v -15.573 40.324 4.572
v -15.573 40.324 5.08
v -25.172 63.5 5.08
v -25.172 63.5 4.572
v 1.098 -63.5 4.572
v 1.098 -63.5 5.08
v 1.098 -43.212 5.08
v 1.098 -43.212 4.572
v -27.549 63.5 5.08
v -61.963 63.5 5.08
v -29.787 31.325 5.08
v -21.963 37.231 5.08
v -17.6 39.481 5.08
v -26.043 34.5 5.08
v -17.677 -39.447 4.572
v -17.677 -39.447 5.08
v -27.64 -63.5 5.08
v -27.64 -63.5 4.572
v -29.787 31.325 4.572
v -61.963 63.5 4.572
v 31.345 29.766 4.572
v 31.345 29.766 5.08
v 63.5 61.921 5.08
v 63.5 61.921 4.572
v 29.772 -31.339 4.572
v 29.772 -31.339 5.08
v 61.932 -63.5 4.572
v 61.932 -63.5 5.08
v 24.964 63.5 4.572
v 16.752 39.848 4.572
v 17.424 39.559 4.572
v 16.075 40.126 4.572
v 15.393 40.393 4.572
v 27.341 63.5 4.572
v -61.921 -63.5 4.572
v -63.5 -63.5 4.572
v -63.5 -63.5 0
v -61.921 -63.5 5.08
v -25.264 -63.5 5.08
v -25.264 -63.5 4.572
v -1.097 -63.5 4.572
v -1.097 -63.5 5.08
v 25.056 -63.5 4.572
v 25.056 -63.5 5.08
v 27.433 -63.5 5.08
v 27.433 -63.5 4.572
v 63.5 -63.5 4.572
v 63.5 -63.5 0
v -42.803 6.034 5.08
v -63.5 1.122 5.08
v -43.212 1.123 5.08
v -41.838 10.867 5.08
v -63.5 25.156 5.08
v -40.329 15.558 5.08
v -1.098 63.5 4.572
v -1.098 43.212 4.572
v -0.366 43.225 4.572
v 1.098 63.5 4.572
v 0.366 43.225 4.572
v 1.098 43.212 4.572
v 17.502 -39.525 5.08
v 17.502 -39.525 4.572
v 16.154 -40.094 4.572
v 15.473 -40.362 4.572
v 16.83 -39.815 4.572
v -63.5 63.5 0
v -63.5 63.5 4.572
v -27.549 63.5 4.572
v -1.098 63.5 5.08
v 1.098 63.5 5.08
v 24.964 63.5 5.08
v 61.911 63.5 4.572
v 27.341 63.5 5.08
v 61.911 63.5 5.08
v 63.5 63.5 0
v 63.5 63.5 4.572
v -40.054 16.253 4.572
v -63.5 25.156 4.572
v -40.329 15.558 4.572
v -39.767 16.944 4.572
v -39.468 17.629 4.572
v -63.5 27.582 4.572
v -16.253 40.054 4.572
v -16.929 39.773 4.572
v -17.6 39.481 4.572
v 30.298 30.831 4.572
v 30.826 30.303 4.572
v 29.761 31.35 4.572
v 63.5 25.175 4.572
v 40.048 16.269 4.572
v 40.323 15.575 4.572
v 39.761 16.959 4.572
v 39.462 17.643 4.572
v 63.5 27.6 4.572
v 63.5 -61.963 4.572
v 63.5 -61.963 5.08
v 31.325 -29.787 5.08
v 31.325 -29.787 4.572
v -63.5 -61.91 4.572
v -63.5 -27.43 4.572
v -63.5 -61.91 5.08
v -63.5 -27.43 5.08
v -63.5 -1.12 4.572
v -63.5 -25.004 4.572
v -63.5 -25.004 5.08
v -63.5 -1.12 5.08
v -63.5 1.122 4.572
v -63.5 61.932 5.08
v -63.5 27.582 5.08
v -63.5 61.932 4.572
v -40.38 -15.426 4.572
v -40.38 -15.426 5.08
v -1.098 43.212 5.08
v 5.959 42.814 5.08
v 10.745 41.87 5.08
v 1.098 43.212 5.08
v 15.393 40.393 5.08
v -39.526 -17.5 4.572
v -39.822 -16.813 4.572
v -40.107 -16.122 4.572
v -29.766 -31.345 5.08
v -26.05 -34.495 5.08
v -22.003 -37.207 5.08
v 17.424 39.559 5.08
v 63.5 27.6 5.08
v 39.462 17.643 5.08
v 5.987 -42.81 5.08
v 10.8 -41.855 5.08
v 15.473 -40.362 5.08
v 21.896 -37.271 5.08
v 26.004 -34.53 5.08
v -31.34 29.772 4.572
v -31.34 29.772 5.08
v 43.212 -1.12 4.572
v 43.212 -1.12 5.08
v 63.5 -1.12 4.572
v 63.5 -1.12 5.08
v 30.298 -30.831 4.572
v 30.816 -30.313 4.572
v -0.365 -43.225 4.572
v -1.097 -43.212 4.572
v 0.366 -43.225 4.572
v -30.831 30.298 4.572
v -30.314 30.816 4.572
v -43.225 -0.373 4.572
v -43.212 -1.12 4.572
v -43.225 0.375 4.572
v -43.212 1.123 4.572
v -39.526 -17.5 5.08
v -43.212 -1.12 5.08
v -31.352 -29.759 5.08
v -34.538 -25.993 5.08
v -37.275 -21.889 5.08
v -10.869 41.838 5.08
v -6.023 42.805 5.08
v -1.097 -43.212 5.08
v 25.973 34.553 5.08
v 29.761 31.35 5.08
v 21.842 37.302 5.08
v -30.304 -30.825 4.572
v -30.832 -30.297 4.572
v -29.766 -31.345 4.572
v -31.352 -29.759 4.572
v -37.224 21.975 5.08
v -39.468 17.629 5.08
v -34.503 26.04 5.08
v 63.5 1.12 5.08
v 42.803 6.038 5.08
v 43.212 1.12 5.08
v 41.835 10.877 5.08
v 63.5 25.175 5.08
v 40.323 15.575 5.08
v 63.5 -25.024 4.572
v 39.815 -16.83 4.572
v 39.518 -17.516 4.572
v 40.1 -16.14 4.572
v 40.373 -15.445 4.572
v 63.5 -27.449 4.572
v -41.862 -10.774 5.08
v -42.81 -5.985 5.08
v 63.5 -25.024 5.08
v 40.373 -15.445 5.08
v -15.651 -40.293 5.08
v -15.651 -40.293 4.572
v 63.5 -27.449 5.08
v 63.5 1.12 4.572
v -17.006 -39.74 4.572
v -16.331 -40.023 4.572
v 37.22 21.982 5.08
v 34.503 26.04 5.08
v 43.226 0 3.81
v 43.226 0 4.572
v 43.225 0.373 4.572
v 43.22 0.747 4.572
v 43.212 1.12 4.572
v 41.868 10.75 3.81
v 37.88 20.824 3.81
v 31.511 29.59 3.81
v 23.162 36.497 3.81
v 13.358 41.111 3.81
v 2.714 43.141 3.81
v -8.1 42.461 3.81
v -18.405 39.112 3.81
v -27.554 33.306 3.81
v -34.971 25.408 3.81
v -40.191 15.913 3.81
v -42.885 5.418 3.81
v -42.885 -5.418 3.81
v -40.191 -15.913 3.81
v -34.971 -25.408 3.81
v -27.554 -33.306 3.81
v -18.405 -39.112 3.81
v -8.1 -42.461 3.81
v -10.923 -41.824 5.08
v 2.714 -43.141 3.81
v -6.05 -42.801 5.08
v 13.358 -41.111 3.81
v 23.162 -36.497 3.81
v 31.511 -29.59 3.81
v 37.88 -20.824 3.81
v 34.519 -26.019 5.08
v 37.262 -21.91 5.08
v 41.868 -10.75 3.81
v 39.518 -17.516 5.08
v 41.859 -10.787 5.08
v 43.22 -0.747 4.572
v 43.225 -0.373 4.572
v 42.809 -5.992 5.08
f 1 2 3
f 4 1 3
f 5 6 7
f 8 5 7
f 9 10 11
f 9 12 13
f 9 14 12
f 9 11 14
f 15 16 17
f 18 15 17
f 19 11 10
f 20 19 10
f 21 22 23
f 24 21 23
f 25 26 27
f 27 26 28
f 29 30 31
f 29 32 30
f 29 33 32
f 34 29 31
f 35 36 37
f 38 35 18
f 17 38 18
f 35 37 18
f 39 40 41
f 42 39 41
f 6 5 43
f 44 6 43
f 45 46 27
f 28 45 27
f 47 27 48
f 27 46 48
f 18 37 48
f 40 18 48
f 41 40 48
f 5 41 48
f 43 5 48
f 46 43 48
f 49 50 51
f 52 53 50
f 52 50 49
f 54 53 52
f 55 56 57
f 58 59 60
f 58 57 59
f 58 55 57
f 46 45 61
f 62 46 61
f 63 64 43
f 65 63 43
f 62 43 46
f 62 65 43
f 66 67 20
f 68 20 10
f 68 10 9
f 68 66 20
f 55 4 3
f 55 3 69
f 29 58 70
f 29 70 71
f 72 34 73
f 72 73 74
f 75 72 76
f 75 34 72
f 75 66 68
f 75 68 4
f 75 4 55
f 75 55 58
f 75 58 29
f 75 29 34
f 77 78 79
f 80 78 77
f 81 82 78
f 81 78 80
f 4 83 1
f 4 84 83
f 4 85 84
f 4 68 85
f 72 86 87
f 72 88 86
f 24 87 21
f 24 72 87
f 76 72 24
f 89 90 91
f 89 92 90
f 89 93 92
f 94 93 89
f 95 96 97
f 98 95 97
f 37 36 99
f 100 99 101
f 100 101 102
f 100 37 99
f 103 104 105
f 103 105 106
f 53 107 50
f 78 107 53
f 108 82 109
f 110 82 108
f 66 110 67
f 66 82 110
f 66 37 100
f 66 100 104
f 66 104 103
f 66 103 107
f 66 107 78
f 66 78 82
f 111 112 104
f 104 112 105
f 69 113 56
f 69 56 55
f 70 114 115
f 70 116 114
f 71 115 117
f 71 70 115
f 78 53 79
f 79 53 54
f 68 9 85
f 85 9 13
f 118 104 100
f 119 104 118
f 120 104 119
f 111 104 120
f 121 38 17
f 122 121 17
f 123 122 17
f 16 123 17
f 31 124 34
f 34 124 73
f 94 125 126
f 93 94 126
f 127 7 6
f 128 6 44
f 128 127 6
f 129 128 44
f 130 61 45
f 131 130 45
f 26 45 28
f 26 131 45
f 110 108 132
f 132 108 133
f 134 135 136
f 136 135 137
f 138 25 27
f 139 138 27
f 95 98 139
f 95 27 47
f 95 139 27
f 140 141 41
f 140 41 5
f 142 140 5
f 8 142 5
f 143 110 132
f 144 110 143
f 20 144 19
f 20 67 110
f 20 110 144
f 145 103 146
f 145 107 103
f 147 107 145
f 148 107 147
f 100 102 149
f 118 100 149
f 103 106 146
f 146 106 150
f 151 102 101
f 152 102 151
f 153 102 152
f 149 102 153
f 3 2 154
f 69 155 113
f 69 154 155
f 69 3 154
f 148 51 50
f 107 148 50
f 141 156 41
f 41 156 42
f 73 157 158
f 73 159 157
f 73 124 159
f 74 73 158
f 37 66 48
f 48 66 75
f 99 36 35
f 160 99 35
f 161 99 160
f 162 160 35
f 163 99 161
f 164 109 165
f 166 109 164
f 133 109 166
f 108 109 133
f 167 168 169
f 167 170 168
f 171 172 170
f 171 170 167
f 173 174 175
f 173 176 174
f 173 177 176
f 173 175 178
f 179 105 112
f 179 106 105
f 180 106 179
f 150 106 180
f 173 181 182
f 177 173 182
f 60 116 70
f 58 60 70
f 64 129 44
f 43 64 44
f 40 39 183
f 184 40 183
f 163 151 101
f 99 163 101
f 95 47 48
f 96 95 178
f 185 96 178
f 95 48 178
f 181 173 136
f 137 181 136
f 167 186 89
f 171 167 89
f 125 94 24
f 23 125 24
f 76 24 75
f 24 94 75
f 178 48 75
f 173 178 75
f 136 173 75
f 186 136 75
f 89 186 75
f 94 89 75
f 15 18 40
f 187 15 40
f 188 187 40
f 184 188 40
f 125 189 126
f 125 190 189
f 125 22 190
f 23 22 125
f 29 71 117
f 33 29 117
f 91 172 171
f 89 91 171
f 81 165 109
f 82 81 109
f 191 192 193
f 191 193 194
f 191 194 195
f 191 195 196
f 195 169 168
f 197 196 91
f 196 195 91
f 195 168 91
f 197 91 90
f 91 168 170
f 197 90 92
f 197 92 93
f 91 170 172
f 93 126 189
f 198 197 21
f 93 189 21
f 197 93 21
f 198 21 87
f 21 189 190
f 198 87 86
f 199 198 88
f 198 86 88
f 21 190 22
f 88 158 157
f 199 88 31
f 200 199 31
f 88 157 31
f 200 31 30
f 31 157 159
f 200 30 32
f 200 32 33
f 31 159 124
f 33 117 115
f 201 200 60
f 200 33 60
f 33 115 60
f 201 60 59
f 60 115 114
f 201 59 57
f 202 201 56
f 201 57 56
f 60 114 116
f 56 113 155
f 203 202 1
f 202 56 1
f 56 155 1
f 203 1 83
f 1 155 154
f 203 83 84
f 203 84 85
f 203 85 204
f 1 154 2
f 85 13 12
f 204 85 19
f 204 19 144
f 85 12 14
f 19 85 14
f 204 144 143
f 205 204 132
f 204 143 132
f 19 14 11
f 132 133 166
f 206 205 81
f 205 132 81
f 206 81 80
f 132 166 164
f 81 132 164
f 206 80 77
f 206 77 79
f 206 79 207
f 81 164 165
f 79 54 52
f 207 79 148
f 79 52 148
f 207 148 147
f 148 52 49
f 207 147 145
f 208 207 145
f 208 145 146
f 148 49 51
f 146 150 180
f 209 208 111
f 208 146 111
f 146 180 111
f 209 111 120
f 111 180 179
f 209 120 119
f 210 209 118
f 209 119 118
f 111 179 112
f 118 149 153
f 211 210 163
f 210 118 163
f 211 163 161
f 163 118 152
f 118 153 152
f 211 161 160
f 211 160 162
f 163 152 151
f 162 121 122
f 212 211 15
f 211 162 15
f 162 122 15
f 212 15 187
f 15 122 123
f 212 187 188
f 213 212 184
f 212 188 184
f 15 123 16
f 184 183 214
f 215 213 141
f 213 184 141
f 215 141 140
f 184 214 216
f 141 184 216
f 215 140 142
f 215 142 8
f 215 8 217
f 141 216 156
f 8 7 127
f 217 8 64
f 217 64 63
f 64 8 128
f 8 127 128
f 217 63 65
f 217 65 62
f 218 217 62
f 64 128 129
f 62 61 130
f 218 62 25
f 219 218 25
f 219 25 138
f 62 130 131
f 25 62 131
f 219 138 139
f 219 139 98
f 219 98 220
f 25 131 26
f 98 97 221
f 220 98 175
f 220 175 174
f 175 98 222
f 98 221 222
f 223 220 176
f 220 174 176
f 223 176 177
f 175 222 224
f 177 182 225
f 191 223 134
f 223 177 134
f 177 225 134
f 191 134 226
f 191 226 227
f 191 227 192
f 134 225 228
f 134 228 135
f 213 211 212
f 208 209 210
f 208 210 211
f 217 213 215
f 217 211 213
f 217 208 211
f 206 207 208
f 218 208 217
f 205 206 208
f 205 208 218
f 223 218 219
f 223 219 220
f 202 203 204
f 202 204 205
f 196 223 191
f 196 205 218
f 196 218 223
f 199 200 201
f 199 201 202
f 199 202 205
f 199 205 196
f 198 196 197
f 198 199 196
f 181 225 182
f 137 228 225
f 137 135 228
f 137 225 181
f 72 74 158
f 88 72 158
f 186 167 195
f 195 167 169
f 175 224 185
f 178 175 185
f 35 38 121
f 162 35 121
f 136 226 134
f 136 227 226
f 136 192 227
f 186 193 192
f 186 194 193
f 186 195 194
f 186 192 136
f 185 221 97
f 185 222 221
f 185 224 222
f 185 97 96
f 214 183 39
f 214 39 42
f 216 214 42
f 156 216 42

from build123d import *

# Parameters (mm, degrees)
F0_W     = 127
F0_H     = 127
F1_DEPTH = 5.08
F2_W     = 2.19577
F2_H     = 52.046703
F3_DEPTH = 0.508
F4_R     = 43.226331
F5_DEPTH = 1.27


with BuildPart() as f1:
    # F0 (on Top) → F1 (new body)
    with BuildSketch(Plane.XY):
        Rectangle(F0_W, F0_H)
    extrude(amount=F1_DEPTH)

    # F2 (on face) → F3 (cut)
    with BuildSketch(Plane.XY.offset(5.08)):
        Polygon((38.169024, -1.120174), (90.2161, -1.120174), (90.2161, 1.120174), (38.13681, 1.120174), align=None)
        Polygon((-1.096878, -38.1697), (-1.097885, -90.216374), (1.097885, -90.216374), (1.097885, -38.169671), align=None)
        with Locations((0, 64.193022)):
            Rectangle(F2_W, F2_H)
        Polygon((-38.168937, 1.123112), (-90.2161, 1.120174), (-90.2161, -1.120174), (-38.169024, -1.120174), align=None)
        Polygon((27.771347, 26.192397), (64.574188, 62.995238), (62.990023, 64.579402), (26.164404, 27.753783), align=None)
        Polygon((26.204134, -27.77076), (63.005977, -64.574029), (64.558622, -63.021384), (27.756045, -26.218808), align=None)
        Polygon((-63.026599, 64.563836), (-64.579243, 63.011192), (-27.776666, 26.208615), (-26.224022, 27.761259), align=None)
        Polygon((-27.793985, -26.20045), (-64.594809, -63.00543), (-63.010644, -64.589595), (-26.207804, -27.786754), align=None)
        Polygon((35.612549, 13.623586), (83.697778, 33.54114), (82.840434, 35.610951), (34.725444, 15.681069), align=None)
        Polygon((13.513826, -35.632124), (33.430295, -83.717366), (35.458923, -82.877081), (15.541512, -34.792197), align=None)
        Polygon((-33.589701, 83.821042), (-35.618328, 82.980757), (-15.700917, 34.895874), (-13.67229, 35.736159), align=None)
        Polygon((-35.772999, -13.517161), (-83.857183, -33.437463), (-82.999839, -35.507274), (-34.914611, -15.58972), align=None)
        Polygon((34.73032, -15.532565), (82.815549, -35.450119), (83.672893, -33.380308), (35.557903, -13.450427), align=None)
        Polygon((-15.724882, -34.735455), (-35.643213, -82.819926), (-33.614586, -83.660211), (-13.697175, -35.575328), align=None)
        Polygon((35.434038, 83.037912), (33.405411, 83.878197), (13.488, 35.793313), (15.516627, 34.953028), align=None)
        Polygon((-34.938291, 15.753233), (-83.024724, 35.668105), (-83.882068, 33.598294), (-35.796839, 13.68074), align=None)
    extrude(amount=-F3_DEPTH, mode=Mode.SUBTRACT)

    # F4 (on face) → F5 (cut)
    with BuildSketch(Plane.XY.offset(5.08)):
        Circle(F4_R)
    extrude(amount=-F5_DEPTH, mode=Mode.SUBTRACT)


solid = f1.part
